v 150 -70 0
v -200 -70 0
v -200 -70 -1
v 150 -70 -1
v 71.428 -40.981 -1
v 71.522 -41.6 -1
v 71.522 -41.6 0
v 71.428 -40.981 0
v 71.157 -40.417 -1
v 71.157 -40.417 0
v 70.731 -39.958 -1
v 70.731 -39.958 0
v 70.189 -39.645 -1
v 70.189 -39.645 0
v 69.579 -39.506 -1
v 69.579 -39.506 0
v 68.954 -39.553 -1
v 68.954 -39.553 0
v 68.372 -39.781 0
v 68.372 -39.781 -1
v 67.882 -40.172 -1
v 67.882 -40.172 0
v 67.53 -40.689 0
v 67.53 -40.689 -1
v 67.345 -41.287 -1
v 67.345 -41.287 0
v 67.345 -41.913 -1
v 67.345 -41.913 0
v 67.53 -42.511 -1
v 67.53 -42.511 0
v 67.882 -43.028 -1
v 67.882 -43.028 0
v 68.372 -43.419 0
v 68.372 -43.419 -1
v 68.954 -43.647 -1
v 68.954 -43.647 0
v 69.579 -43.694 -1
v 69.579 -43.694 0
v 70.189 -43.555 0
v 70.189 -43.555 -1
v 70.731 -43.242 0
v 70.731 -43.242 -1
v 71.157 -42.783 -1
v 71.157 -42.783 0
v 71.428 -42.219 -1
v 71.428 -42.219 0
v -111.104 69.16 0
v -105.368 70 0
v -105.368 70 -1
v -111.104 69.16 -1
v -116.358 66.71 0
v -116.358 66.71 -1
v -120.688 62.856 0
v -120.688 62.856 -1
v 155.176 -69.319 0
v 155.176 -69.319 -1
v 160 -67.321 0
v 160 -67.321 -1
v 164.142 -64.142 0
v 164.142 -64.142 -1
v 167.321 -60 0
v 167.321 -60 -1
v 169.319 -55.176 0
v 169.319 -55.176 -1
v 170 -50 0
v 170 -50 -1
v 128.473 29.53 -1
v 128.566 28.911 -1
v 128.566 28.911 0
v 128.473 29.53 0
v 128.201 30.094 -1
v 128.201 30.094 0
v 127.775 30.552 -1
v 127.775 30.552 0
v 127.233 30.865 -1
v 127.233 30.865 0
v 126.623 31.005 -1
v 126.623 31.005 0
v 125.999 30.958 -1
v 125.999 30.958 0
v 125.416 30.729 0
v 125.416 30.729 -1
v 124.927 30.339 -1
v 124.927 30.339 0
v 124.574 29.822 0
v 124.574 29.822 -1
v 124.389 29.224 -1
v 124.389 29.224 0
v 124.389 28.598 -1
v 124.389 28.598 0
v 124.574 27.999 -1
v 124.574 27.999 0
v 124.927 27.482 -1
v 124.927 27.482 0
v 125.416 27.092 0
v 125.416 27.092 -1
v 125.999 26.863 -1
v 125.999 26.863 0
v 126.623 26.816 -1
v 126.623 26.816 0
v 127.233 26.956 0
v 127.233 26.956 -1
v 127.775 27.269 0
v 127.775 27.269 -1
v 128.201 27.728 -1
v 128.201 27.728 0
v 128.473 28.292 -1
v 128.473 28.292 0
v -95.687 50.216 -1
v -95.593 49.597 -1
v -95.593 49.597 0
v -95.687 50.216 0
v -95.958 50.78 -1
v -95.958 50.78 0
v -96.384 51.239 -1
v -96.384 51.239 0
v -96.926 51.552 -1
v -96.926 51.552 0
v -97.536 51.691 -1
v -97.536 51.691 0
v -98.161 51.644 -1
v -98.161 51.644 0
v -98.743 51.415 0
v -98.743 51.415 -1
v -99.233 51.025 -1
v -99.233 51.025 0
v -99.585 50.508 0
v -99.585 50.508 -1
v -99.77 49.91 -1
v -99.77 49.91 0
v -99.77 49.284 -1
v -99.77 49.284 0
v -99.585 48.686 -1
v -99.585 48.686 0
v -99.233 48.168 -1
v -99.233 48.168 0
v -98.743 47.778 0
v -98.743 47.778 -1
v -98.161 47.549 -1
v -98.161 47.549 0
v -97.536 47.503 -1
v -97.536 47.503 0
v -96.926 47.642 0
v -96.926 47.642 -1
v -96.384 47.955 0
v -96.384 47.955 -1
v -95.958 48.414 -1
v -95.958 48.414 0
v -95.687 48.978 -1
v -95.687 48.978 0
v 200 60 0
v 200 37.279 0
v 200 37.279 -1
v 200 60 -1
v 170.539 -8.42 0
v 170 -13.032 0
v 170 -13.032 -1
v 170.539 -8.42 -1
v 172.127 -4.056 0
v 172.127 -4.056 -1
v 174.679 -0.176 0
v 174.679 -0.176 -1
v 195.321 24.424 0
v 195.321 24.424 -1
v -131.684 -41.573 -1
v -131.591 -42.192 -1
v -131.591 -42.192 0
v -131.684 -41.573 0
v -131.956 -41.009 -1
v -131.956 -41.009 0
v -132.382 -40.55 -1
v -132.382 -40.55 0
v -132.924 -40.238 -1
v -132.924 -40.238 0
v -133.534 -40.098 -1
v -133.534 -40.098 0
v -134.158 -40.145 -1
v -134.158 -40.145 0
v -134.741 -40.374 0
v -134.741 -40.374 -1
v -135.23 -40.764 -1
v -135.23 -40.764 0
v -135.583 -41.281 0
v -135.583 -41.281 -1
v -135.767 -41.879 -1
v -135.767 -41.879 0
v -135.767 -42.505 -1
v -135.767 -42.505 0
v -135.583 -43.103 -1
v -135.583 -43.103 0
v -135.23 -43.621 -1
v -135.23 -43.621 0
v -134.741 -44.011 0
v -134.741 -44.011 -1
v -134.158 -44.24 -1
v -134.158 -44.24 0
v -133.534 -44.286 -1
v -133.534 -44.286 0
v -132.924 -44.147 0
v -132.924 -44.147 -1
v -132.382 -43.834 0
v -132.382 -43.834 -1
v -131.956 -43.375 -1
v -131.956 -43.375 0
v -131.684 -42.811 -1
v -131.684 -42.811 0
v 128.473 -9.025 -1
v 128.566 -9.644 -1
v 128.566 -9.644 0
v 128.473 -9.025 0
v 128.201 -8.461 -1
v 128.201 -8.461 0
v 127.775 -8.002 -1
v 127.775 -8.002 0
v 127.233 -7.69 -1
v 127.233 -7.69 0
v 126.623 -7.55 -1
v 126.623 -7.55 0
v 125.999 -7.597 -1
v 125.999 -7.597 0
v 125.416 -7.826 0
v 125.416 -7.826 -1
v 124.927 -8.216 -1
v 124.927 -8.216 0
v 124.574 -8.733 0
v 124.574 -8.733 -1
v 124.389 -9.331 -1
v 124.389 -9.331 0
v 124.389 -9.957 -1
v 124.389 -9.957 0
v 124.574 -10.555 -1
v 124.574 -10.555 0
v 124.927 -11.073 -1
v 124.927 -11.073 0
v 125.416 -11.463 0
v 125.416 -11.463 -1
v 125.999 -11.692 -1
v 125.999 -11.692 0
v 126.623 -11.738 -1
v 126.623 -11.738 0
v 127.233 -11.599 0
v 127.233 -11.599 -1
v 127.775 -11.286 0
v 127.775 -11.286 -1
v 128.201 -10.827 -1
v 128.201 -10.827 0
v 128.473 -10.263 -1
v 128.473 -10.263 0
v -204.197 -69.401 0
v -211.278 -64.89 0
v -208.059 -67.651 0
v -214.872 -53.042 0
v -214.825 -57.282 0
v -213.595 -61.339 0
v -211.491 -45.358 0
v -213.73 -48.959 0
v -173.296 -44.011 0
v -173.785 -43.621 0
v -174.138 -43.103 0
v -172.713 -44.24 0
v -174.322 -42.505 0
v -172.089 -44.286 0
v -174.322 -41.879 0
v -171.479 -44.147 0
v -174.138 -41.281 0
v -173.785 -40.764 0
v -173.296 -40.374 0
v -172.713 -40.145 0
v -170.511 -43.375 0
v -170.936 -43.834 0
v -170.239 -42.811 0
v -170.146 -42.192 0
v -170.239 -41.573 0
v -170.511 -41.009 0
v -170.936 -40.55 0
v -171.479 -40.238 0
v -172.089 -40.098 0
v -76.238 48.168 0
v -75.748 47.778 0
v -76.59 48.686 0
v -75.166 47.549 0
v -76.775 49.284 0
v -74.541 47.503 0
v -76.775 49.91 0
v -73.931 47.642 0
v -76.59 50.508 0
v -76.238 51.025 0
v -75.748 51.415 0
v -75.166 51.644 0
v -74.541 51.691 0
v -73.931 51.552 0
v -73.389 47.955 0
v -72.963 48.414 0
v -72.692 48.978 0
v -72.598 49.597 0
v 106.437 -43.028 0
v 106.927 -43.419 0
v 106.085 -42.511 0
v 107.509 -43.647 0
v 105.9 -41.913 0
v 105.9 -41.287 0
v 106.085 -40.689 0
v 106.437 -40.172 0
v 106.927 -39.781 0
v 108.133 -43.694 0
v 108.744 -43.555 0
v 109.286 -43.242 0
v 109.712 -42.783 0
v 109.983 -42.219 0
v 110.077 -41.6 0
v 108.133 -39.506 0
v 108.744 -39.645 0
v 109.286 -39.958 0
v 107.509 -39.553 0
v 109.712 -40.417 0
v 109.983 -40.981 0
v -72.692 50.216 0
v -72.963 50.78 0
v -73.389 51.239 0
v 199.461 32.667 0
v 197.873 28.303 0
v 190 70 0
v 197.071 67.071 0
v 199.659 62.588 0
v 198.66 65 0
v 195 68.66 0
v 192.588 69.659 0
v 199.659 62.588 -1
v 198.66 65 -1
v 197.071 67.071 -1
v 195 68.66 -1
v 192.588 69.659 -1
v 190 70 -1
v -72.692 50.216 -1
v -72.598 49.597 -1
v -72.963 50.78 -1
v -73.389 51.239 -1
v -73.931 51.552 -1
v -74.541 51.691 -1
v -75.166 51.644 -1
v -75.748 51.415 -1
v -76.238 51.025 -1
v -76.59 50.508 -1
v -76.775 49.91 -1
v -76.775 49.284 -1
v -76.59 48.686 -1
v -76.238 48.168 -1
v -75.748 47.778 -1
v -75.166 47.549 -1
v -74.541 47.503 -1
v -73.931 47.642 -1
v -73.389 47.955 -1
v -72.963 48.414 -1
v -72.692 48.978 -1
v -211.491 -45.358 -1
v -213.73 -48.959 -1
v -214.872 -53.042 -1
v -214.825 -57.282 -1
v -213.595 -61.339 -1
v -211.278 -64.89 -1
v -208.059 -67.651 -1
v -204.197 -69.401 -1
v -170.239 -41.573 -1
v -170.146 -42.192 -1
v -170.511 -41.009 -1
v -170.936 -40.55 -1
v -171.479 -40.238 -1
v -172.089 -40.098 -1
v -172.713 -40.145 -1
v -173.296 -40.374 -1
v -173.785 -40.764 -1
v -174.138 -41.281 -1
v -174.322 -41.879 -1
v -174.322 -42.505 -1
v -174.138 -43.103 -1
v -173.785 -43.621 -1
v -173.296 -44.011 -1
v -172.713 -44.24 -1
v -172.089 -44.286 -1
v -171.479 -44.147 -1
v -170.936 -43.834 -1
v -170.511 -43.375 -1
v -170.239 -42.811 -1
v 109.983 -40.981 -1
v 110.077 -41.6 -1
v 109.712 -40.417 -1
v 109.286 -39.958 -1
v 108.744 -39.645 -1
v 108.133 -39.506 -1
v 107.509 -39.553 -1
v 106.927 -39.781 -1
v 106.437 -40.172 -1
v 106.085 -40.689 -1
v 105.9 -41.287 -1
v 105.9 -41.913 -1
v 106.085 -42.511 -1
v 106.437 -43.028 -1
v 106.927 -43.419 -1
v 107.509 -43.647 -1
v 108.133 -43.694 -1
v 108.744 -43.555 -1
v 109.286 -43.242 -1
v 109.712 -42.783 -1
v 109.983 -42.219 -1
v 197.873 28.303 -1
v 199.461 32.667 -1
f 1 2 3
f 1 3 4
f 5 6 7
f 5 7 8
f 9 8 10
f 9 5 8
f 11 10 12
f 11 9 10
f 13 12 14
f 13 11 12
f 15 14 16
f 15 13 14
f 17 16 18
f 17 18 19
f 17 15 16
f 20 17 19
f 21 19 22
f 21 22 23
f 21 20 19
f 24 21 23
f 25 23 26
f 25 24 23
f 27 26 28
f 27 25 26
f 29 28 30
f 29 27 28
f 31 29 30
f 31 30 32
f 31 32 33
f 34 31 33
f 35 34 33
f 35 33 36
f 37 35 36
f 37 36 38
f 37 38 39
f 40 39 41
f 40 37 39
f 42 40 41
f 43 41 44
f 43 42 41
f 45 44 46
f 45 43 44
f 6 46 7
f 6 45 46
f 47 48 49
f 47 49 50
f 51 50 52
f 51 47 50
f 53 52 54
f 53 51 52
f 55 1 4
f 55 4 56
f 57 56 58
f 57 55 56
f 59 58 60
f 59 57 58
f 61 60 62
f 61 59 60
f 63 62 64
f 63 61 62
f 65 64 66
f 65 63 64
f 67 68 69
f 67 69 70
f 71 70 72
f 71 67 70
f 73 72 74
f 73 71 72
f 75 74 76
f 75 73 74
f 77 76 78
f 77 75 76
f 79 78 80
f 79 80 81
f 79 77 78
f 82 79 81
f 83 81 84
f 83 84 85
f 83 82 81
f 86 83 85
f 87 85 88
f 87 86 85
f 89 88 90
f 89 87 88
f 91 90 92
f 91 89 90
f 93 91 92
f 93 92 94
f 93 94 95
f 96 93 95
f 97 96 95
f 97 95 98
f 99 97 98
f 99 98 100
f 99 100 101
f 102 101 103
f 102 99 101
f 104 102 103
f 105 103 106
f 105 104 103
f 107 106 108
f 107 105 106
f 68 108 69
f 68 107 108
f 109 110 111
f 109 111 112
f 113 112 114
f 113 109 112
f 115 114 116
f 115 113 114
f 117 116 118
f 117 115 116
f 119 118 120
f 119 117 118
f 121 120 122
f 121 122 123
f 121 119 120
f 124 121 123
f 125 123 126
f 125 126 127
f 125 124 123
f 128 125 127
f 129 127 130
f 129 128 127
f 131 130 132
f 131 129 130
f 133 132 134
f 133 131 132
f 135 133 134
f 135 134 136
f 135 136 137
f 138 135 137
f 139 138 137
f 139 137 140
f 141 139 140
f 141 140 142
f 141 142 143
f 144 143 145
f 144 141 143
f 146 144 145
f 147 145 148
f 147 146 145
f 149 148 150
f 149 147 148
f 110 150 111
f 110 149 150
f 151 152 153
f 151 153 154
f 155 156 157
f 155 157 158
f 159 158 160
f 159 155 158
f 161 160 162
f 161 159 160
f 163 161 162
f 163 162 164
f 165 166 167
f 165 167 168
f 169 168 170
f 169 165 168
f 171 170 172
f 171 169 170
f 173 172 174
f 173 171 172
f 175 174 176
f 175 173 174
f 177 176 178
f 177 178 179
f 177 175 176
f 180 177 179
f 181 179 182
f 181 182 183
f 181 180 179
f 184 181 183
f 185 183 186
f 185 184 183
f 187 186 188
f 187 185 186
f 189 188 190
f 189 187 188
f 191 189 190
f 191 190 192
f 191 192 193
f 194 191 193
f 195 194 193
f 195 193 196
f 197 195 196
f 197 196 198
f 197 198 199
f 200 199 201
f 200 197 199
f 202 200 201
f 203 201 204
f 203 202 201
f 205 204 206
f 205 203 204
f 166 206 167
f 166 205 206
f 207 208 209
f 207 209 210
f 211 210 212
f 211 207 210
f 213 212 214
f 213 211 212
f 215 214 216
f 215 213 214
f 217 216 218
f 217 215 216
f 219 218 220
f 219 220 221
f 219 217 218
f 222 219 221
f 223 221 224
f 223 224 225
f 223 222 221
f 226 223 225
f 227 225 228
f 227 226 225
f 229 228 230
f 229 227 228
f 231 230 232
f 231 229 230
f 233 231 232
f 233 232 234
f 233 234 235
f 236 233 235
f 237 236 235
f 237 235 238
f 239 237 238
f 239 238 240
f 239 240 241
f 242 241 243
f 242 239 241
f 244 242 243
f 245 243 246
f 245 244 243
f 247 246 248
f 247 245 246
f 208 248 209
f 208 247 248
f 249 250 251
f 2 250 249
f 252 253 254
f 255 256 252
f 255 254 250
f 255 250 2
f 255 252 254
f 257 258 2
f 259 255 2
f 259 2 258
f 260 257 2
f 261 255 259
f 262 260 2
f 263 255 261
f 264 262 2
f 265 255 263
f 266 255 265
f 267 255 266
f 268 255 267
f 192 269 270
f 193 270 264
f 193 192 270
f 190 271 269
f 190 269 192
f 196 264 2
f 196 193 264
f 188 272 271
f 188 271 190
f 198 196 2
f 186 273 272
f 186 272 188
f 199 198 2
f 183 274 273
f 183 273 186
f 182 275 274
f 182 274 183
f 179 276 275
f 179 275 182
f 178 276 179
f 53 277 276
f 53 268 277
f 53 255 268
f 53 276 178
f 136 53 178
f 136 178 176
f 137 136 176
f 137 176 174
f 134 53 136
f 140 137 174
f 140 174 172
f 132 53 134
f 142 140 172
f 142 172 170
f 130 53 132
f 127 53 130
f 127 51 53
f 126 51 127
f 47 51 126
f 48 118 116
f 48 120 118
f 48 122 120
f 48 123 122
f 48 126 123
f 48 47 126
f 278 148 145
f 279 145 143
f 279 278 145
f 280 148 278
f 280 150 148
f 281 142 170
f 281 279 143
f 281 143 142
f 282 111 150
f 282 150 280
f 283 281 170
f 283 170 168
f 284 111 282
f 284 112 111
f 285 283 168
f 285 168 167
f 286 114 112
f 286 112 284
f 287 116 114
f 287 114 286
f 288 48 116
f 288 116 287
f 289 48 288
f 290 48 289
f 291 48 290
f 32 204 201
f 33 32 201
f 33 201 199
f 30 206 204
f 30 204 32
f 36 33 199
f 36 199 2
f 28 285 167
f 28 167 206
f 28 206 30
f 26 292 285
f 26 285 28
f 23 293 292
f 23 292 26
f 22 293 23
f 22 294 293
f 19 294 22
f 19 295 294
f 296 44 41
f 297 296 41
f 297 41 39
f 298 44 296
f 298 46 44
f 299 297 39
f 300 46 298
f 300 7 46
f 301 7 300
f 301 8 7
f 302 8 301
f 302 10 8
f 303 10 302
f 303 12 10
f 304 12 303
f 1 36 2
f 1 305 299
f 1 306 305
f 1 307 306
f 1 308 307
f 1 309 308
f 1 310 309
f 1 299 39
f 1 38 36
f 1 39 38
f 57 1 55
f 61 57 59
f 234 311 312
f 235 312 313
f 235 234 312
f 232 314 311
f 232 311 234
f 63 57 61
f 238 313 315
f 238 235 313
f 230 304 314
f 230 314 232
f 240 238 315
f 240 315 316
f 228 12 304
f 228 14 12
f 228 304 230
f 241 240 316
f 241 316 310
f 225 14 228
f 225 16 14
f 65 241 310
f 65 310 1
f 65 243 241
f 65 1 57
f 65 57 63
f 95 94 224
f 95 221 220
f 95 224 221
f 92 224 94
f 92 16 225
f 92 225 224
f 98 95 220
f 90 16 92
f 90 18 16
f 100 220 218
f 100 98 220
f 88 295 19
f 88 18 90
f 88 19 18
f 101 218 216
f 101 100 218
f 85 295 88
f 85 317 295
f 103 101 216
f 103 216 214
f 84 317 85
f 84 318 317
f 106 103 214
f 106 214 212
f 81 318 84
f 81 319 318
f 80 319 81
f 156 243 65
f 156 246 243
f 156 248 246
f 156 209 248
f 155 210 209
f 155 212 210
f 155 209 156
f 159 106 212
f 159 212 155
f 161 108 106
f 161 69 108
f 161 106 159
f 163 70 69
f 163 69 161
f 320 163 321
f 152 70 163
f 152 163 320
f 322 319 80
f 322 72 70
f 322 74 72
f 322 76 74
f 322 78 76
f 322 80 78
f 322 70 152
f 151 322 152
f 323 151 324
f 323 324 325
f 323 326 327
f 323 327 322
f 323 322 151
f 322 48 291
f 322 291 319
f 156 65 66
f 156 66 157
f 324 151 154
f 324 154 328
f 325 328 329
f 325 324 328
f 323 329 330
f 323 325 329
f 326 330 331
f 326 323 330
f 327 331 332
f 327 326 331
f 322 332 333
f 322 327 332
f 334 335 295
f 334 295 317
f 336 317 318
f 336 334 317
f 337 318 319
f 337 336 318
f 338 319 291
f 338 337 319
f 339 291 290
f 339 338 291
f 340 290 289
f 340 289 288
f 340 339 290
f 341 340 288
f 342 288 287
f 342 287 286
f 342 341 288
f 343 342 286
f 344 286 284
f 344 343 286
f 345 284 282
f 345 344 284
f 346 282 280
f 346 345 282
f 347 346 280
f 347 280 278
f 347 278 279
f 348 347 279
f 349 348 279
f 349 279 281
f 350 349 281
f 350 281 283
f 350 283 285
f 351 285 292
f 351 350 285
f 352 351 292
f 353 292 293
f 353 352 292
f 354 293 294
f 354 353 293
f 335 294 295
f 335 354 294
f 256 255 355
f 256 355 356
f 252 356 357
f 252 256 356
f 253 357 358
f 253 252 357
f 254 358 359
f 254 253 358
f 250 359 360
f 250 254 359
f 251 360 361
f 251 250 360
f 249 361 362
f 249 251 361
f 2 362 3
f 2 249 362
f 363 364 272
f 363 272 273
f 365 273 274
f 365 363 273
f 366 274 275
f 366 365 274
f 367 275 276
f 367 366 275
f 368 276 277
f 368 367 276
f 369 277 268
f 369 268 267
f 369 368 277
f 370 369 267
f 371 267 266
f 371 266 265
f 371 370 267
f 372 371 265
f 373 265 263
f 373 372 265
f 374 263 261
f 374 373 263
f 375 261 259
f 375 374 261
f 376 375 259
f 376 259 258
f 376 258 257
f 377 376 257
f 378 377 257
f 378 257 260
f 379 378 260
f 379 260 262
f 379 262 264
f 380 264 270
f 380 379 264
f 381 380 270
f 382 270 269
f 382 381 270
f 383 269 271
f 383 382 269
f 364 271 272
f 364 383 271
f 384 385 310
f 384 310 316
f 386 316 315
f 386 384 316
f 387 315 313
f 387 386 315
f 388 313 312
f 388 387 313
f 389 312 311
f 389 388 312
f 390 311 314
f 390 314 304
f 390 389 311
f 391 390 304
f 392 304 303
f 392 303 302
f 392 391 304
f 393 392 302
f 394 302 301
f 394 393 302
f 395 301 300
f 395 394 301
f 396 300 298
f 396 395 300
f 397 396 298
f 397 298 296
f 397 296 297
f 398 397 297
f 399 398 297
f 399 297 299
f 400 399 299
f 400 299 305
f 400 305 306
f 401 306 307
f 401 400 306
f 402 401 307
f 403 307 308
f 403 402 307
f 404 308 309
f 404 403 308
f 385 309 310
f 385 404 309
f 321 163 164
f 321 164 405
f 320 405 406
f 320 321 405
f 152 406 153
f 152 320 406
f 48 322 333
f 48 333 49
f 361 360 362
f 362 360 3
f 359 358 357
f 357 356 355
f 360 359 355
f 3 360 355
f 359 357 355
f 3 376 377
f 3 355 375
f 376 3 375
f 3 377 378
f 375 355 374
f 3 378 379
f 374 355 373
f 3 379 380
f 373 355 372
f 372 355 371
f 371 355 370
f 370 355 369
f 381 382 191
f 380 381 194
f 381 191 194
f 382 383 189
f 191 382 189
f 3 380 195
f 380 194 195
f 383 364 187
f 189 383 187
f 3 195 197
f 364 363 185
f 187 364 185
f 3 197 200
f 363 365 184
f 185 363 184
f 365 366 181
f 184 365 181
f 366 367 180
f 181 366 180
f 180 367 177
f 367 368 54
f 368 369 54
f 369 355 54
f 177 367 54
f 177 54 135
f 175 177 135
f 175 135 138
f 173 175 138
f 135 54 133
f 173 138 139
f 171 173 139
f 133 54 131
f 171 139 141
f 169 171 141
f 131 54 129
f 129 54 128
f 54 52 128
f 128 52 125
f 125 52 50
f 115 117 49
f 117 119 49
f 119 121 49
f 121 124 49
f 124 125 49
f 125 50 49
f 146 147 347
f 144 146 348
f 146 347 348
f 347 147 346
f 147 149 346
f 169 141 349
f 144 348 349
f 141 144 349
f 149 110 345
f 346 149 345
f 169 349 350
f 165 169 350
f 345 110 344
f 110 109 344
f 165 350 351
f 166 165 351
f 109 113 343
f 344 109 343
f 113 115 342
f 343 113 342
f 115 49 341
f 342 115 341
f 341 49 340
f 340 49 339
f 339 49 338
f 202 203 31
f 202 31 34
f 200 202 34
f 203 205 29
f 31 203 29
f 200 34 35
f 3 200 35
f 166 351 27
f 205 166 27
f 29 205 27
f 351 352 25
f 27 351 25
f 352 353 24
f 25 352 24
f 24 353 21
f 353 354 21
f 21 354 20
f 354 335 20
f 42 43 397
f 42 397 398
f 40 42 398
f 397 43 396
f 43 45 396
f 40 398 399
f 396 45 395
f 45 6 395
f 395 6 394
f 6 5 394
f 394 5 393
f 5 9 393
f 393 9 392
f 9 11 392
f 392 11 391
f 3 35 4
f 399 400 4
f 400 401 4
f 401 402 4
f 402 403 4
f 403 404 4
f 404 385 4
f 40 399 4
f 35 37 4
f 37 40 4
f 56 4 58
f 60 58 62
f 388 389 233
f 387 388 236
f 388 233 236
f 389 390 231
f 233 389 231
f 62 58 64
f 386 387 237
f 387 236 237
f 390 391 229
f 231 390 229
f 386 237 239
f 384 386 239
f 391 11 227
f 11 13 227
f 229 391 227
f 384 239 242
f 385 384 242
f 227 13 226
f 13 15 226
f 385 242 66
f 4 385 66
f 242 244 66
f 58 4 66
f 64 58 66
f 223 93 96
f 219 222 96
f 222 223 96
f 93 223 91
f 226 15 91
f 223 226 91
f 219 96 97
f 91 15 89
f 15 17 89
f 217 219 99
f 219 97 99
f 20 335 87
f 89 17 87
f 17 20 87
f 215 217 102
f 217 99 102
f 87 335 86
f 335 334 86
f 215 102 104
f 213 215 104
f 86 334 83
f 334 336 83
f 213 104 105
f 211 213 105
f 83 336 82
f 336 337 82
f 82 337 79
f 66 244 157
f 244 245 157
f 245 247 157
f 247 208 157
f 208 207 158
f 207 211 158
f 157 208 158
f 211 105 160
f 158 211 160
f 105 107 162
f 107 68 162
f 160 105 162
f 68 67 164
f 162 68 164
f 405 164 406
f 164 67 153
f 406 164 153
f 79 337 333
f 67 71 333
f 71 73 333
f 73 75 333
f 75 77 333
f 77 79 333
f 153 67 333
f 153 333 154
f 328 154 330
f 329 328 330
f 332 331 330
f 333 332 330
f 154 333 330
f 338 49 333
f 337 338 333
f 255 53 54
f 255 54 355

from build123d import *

# Parameters (mm, degrees)
BASE_FLANGE1_DEPTH                 = 1
F_4_2_START                        = -1
F_4_2_4_2_DIAMETER_HOLE1_OUTLINE_R = 2.1
F_4_2_4_2_DIAMETER_HOLE1_DEPTH     = 1


# Read off the part's stored shape, not the designer's step: Ø4.2 (4.2) Diameter Hole1
# Sheet-metal steps are written as plain solids
with BuildPart() as part:
    # Sketch1 → Base-Flange1 (new body)
    with BuildSketch(Plane.XY):
        with BuildLine():
            Line((-120.688391142, 62.855752194), (-211.490666647, -45.358185855))
            ThreePointArc((-211.490666647, -45.358185855), (-213.594616806, -61.339273926), (-200, -70))
            Line((-200, -70), (150, -70))
            ThreePointArc((150, -70), (164.142135624, -64.142135624), (170, -50))
            Line((170, -50), (170, -13.032012463))
            ThreePointArc((170, -13.032012463), (171.206147584, -6.191609597), (174.679111138, -0.176260269))
            Line((174.679111138, -0.176260269), (195.320888862, 24.423652492))
            ThreePointArc((195.320888862, 24.423652492), (198.793852416, 30.439001819), (200, 37.279404685))
            Line((200, 37.279404685), (200, 60))
            ThreePointArc((200, 60), (197.071067812, 67.071067812), (190, 70))
            Line((190, 70), (-105.36750228, 70))
            ThreePointArc((-105.36750228, 70), (-113.819867515, 68.126155741), (-120.688391142, 62.855752194))
        make_face()
    extrude(amount=-BASE_FLANGE1_DEPTH)

    # Ø4.2 (4.2) Diameter Hole1 outline → Ø4.2 (4.2) Diameter Hole1 (cut)
    with BuildSketch(Plane.XY.offset(F_4_2_START)):
        with Locations((107.976556815, -41.6)):
            Circle(F_4_2_4_2_DIAMETER_HOLE1_OUTLINE_R)
        with Locations((69.42162602, -41.6)):
            Circle(F_4_2_4_2_DIAMETER_HOLE1_OUTLINE_R)
        with Locations((-133.690845807, -42.192339034)):
            Circle(F_4_2_4_2_DIAMETER_HOLE1_OUTLINE_R)
        with Locations((-172.245776602, -42.192339034)):
            Circle(F_4_2_4_2_DIAMETER_HOLE1_OUTLINE_R)
        with Locations((-74.698274088, 49.596767959)):
            Circle(F_4_2_4_2_DIAMETER_HOLE1_OUTLINE_R)
        with Locations((126.46596136, -9.64433534)):
            Circle(F_4_2_4_2_DIAMETER_HOLE1_OUTLINE_R)
        with Locations((-97.693405311, 49.596767959)):
            Circle(F_4_2_4_2_DIAMETER_HOLE1_OUTLINE_R)
        with Locations((126.46596136, 28.910595455)):
            Circle(F_4_2_4_2_DIAMETER_HOLE1_OUTLINE_R)
    extrude(amount=F_4_2_4_2_DIAMETER_HOLE1_DEPTH, mode=Mode.SUBTRACT)


solid = part.part
